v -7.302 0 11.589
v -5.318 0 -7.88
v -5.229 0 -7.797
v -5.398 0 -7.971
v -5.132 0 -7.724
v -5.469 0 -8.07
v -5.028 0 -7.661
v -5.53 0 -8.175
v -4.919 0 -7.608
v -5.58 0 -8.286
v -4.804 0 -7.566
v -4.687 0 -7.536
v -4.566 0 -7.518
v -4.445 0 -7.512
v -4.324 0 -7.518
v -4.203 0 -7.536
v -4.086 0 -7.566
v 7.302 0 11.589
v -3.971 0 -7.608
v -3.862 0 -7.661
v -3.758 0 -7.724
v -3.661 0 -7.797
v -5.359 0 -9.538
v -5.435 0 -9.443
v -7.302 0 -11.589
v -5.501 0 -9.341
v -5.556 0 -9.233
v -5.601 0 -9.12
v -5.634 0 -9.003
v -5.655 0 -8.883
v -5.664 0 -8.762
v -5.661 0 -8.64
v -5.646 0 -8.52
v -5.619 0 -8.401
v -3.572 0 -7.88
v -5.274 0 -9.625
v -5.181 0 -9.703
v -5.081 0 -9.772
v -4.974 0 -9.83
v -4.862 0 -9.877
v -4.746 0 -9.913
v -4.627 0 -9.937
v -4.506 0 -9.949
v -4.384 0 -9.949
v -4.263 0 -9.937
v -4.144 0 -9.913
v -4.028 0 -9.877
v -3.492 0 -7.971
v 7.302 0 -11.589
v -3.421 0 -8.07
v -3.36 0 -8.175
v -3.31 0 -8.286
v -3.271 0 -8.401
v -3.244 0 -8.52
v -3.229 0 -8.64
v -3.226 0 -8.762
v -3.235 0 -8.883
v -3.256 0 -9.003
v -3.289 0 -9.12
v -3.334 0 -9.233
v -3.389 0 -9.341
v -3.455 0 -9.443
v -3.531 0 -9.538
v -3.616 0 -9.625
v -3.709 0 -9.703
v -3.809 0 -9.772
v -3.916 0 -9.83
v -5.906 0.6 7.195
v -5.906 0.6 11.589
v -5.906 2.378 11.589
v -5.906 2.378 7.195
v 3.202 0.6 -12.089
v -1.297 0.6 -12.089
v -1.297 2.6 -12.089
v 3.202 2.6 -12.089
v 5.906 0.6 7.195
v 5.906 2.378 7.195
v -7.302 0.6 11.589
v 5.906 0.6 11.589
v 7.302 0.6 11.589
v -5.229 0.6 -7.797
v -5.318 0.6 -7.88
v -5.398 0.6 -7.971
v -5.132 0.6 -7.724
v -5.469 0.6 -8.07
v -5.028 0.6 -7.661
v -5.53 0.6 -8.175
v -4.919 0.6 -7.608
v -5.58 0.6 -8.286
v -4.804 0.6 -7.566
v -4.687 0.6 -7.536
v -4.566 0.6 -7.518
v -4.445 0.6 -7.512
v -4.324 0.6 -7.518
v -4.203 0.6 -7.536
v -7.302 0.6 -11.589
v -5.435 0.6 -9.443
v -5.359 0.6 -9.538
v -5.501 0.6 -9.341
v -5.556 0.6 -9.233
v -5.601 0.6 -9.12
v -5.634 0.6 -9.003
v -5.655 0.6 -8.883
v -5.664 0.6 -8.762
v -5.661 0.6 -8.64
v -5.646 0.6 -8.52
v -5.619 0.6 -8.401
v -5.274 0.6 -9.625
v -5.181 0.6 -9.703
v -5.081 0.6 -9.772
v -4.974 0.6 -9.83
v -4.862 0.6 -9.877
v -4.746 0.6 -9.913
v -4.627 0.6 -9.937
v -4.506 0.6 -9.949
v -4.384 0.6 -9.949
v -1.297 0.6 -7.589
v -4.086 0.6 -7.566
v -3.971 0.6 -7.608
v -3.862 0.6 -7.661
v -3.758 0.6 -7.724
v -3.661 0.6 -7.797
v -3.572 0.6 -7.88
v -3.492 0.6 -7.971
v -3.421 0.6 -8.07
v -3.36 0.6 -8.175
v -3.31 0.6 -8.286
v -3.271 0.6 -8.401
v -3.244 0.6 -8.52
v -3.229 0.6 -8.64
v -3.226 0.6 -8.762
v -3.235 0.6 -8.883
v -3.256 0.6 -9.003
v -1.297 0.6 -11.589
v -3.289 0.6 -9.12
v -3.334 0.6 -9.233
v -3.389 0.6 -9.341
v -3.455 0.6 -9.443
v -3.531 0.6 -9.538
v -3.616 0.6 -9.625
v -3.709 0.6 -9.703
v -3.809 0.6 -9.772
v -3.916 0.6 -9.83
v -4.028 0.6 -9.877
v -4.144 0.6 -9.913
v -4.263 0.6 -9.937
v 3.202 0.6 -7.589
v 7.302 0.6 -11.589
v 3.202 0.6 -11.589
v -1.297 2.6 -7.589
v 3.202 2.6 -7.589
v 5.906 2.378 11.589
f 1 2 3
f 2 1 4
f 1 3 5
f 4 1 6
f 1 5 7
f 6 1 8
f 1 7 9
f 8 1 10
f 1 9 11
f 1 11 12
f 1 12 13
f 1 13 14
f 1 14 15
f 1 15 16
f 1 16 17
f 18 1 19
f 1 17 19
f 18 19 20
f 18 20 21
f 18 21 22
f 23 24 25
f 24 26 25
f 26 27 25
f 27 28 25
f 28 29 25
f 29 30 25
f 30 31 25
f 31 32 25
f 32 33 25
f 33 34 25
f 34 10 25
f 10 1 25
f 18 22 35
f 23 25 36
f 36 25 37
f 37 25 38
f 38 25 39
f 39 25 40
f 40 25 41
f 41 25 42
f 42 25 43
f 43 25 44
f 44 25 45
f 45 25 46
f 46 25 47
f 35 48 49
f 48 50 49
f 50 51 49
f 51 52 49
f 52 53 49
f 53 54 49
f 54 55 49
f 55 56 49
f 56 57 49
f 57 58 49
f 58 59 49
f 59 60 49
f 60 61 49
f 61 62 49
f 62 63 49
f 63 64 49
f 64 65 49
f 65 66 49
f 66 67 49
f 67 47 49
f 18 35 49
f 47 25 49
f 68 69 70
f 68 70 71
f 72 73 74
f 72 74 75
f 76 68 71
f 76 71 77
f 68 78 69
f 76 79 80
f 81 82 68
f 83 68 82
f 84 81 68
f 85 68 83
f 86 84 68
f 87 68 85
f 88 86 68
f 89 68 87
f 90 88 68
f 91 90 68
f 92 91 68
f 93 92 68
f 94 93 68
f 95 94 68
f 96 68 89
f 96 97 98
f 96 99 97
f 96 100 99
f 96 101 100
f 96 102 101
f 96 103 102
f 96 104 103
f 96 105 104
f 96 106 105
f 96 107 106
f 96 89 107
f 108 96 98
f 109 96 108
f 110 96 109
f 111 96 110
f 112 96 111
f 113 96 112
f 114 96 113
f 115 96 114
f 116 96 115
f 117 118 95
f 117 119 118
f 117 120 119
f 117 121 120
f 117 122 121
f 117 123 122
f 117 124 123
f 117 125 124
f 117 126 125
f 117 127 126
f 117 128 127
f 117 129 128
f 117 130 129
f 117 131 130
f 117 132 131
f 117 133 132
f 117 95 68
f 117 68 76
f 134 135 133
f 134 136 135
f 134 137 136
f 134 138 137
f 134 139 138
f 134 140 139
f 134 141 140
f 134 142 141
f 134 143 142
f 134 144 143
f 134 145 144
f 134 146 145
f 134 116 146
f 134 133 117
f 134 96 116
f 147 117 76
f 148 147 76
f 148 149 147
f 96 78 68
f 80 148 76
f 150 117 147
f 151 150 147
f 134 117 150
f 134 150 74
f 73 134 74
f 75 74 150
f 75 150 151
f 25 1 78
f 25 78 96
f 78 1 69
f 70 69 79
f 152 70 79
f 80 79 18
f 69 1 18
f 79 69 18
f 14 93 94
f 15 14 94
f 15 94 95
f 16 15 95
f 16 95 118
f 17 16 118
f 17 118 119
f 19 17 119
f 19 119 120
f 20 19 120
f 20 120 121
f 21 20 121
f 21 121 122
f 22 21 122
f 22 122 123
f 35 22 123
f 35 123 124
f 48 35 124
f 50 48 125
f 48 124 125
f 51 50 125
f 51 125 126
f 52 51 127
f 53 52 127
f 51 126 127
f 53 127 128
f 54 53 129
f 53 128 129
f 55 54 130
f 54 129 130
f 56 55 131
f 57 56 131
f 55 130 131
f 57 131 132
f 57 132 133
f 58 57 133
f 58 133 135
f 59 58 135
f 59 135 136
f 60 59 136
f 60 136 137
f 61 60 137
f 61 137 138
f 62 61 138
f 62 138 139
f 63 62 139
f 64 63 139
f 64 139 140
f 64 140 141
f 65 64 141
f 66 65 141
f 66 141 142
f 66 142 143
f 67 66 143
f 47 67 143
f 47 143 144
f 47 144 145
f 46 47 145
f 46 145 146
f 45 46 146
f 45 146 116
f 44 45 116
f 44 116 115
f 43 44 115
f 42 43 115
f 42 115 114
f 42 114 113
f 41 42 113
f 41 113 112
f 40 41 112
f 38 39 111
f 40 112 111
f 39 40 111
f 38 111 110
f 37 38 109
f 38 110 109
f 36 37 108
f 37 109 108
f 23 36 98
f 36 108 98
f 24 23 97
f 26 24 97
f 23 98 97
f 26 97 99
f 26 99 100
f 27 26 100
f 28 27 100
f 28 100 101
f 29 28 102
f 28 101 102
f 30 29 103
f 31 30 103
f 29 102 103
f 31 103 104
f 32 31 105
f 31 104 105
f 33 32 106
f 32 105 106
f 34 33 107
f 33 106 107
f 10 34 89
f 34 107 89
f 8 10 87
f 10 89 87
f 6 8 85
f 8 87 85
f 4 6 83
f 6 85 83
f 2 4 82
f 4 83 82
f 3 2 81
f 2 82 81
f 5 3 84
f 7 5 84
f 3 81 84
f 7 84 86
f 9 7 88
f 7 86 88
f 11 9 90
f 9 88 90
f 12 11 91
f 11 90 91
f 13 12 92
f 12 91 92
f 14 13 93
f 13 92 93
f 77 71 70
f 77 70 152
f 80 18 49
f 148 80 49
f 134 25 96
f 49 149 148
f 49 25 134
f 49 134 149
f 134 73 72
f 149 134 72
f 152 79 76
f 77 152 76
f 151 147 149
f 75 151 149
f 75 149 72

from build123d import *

# Parameters (mm, degrees)
SKETCH1_W           = 14.605
SKETCH1_H           = 23.1775
BOSS_EXTRUDE1_DEPTH = 0.6
SKETCH2_R           = 1.2192
CUT_EXTRUDE1_DEPTH  = 14.710785273
SKETCH3_W           = 11.811
SKETCH3_H           = 4.3942
BOSS_EXTRUDE2_DEPTH = 1.778
SKETCH4_W           = 4.5
SKETCH4_H           = 4.5
BOSS_EXTRUDE3_DEPTH = 2


with BuildPart() as part:
    # Sketch1 → Boss-Extrude1 (new body)
    with BuildSketch(Plane(origin=(0, 0, 0), x_dir=(1, 0, 0), z_dir=(0, 1, 0))):
        Rectangle(SKETCH1_W, SKETCH1_H)
    extrude(amount=BOSS_EXTRUDE1_DEPTH)

    # Sketch2 → Cut-Extrude1 (cut, through all)
    with BuildSketch(Plane(origin=(0, 0.6, 0), x_dir=(1, 0, 0), z_dir=(0, 1, 0))):
        with Locations(Location((-4.445, 8.73125, 0), (0, 0, 270))):
            Circle(SKETCH2_R)
    extrude(amount=-CUT_EXTRUDE1_DEPTH, mode=Mode.SUBTRACT)

    # Sketch3 → Boss-Extrude2 (add)
    with BuildSketch(Plane(origin=(0, 0.6, 0.6), x_dir=(1, 0, 0), z_dir=(0, 1, 0))):
        with Locations((0, -8.79165)):
            Rectangle(SKETCH3_W, SKETCH3_H)
    extrude(amount=BOSS_EXTRUDE2_DEPTH)

    # Sketch4 → Boss-Extrude3 (add)
    with BuildSketch(Plane(origin=(0, 0.6, 0), x_dir=(1, 0, 0), z_dir=(0, 1, 0))):
        with Locations((0.9525, 9.83875)):
            Rectangle(SKETCH4_W, SKETCH4_H)
    extrude(amount=BOSS_EXTRUDE3_DEPTH)


solid = part.part
